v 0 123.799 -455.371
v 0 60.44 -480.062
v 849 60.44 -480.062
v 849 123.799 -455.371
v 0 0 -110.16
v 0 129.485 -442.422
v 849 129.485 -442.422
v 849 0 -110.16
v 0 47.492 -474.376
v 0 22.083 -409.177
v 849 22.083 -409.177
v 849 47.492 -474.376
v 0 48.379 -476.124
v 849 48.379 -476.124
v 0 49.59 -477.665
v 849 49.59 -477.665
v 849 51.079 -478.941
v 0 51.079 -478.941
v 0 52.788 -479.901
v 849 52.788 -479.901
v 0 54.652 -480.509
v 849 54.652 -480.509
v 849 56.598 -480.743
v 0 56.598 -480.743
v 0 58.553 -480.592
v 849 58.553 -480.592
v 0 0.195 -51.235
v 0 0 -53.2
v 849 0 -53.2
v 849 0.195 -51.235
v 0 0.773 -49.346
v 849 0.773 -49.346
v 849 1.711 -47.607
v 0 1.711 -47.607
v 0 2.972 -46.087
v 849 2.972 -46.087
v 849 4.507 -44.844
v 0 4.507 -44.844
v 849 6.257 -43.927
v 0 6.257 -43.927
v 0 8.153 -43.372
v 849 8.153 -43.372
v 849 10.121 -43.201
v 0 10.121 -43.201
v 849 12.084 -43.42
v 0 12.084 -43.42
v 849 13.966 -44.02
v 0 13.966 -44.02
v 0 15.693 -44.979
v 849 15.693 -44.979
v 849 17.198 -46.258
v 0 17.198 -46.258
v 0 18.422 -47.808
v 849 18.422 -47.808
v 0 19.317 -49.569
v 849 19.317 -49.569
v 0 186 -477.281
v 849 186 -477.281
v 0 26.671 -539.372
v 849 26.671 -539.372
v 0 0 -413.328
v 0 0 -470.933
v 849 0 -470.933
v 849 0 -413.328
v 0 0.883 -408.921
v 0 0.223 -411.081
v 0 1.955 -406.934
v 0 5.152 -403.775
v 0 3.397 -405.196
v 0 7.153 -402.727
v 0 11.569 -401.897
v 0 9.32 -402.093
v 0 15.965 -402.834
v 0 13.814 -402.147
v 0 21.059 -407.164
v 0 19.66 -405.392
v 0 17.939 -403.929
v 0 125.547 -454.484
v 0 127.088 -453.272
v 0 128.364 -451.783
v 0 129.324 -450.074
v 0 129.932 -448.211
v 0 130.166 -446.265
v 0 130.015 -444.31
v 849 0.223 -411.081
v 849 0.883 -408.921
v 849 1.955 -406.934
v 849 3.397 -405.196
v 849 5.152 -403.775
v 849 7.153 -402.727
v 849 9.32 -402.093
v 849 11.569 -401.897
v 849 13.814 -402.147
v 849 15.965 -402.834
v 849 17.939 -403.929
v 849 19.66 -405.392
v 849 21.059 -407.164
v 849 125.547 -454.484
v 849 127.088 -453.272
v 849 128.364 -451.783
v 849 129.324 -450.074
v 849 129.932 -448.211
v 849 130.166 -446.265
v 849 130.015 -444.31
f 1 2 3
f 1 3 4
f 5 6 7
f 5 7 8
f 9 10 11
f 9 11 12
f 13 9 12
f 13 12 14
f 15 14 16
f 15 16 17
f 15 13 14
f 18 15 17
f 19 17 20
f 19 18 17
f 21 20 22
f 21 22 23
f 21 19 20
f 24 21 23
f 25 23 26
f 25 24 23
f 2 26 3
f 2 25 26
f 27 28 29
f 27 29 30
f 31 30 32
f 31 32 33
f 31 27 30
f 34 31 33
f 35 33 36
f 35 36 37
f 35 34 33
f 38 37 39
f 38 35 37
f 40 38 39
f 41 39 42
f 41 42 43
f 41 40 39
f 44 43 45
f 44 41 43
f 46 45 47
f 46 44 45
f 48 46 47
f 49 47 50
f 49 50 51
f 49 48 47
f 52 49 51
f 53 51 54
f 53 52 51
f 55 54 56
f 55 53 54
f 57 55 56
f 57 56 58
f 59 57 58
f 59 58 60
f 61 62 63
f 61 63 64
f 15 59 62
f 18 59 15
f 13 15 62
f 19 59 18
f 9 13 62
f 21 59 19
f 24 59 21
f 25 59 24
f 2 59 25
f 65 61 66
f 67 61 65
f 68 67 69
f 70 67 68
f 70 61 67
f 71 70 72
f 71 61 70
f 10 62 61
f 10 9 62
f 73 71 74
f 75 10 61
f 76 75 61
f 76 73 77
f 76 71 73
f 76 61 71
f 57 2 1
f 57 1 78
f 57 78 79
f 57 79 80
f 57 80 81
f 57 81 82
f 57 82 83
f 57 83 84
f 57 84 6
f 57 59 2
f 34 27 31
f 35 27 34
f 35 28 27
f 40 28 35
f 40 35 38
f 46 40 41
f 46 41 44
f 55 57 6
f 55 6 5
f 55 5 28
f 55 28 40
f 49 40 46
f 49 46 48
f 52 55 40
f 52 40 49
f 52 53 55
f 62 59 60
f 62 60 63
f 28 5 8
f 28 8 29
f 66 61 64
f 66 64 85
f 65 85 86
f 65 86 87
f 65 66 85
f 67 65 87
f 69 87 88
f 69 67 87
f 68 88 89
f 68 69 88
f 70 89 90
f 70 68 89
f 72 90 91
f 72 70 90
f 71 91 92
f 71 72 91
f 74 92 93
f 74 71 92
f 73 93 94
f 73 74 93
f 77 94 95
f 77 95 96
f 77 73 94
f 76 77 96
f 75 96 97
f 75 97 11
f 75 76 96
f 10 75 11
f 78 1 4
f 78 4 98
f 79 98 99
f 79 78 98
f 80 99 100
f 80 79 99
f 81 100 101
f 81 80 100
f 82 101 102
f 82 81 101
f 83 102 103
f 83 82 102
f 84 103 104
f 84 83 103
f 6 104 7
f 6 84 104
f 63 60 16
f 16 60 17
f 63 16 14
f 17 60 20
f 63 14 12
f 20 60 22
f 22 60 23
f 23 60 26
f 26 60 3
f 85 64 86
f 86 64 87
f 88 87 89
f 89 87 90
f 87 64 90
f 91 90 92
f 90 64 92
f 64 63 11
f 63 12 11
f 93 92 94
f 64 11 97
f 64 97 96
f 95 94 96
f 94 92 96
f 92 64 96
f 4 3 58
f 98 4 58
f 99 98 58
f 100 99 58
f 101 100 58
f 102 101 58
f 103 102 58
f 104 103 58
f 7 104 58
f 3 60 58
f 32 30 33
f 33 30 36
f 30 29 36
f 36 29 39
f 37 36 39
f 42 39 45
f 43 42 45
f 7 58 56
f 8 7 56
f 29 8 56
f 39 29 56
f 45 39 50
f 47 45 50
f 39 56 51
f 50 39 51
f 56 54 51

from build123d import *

# Parameters (mm, degrees)
AUFSATZ_LINEAR_AUSTRAGEN1_DEPTH = 849


with BuildPart() as part:
    # Skizze1 → Aufsatz-Linear austragen1 (new body)
    with BuildSketch(Plane(origin=(0, 0, 0), x_dir=(0, 0, -1), z_dir=(1, 0, 0))):
        with BuildLine():
            Line((49.569106164, 19.317466899), (477.280680476, 186))
            Line((477.280680476, 186), (539.372310058, 26.671316029))
            Line((539.372310058, 26.671316029), (470.933041974, 0))
            Line((470.933041974, 0), (413.328001817, 0))
            ThreePointArc((413.328001817, 0), (402.093085354, 9.319853414), (409.17705944, 22.083094646))
            Line((409.17705944, 22.083094646), (474.376050862, 47.491649613))
            ThreePointArc((474.376050862, 47.491649613), (479.900973413, 52.788240457), (480.062428312, 60.440205962))
            Line((480.062428312, 60.440205962), (455.371020057, 123.798980874))
            ThreePointArc((455.371020057, 123.798980874), (450.074429213, 129.323903425), (442.422463709, 129.485358324))
            Line((442.422463709, 129.485358324), (110.1597759, 0))
            Line((110.1597759, 0), (53.200195614, 0))
            ThreePointArc((53.200195614, 0), (43.372310058, 8.152659884), (49.569106164, 19.317466899))
        make_face()
    extrude(amount=AUFSATZ_LINEAR_AUSTRAGEN1_DEPTH)


solid = part.part
